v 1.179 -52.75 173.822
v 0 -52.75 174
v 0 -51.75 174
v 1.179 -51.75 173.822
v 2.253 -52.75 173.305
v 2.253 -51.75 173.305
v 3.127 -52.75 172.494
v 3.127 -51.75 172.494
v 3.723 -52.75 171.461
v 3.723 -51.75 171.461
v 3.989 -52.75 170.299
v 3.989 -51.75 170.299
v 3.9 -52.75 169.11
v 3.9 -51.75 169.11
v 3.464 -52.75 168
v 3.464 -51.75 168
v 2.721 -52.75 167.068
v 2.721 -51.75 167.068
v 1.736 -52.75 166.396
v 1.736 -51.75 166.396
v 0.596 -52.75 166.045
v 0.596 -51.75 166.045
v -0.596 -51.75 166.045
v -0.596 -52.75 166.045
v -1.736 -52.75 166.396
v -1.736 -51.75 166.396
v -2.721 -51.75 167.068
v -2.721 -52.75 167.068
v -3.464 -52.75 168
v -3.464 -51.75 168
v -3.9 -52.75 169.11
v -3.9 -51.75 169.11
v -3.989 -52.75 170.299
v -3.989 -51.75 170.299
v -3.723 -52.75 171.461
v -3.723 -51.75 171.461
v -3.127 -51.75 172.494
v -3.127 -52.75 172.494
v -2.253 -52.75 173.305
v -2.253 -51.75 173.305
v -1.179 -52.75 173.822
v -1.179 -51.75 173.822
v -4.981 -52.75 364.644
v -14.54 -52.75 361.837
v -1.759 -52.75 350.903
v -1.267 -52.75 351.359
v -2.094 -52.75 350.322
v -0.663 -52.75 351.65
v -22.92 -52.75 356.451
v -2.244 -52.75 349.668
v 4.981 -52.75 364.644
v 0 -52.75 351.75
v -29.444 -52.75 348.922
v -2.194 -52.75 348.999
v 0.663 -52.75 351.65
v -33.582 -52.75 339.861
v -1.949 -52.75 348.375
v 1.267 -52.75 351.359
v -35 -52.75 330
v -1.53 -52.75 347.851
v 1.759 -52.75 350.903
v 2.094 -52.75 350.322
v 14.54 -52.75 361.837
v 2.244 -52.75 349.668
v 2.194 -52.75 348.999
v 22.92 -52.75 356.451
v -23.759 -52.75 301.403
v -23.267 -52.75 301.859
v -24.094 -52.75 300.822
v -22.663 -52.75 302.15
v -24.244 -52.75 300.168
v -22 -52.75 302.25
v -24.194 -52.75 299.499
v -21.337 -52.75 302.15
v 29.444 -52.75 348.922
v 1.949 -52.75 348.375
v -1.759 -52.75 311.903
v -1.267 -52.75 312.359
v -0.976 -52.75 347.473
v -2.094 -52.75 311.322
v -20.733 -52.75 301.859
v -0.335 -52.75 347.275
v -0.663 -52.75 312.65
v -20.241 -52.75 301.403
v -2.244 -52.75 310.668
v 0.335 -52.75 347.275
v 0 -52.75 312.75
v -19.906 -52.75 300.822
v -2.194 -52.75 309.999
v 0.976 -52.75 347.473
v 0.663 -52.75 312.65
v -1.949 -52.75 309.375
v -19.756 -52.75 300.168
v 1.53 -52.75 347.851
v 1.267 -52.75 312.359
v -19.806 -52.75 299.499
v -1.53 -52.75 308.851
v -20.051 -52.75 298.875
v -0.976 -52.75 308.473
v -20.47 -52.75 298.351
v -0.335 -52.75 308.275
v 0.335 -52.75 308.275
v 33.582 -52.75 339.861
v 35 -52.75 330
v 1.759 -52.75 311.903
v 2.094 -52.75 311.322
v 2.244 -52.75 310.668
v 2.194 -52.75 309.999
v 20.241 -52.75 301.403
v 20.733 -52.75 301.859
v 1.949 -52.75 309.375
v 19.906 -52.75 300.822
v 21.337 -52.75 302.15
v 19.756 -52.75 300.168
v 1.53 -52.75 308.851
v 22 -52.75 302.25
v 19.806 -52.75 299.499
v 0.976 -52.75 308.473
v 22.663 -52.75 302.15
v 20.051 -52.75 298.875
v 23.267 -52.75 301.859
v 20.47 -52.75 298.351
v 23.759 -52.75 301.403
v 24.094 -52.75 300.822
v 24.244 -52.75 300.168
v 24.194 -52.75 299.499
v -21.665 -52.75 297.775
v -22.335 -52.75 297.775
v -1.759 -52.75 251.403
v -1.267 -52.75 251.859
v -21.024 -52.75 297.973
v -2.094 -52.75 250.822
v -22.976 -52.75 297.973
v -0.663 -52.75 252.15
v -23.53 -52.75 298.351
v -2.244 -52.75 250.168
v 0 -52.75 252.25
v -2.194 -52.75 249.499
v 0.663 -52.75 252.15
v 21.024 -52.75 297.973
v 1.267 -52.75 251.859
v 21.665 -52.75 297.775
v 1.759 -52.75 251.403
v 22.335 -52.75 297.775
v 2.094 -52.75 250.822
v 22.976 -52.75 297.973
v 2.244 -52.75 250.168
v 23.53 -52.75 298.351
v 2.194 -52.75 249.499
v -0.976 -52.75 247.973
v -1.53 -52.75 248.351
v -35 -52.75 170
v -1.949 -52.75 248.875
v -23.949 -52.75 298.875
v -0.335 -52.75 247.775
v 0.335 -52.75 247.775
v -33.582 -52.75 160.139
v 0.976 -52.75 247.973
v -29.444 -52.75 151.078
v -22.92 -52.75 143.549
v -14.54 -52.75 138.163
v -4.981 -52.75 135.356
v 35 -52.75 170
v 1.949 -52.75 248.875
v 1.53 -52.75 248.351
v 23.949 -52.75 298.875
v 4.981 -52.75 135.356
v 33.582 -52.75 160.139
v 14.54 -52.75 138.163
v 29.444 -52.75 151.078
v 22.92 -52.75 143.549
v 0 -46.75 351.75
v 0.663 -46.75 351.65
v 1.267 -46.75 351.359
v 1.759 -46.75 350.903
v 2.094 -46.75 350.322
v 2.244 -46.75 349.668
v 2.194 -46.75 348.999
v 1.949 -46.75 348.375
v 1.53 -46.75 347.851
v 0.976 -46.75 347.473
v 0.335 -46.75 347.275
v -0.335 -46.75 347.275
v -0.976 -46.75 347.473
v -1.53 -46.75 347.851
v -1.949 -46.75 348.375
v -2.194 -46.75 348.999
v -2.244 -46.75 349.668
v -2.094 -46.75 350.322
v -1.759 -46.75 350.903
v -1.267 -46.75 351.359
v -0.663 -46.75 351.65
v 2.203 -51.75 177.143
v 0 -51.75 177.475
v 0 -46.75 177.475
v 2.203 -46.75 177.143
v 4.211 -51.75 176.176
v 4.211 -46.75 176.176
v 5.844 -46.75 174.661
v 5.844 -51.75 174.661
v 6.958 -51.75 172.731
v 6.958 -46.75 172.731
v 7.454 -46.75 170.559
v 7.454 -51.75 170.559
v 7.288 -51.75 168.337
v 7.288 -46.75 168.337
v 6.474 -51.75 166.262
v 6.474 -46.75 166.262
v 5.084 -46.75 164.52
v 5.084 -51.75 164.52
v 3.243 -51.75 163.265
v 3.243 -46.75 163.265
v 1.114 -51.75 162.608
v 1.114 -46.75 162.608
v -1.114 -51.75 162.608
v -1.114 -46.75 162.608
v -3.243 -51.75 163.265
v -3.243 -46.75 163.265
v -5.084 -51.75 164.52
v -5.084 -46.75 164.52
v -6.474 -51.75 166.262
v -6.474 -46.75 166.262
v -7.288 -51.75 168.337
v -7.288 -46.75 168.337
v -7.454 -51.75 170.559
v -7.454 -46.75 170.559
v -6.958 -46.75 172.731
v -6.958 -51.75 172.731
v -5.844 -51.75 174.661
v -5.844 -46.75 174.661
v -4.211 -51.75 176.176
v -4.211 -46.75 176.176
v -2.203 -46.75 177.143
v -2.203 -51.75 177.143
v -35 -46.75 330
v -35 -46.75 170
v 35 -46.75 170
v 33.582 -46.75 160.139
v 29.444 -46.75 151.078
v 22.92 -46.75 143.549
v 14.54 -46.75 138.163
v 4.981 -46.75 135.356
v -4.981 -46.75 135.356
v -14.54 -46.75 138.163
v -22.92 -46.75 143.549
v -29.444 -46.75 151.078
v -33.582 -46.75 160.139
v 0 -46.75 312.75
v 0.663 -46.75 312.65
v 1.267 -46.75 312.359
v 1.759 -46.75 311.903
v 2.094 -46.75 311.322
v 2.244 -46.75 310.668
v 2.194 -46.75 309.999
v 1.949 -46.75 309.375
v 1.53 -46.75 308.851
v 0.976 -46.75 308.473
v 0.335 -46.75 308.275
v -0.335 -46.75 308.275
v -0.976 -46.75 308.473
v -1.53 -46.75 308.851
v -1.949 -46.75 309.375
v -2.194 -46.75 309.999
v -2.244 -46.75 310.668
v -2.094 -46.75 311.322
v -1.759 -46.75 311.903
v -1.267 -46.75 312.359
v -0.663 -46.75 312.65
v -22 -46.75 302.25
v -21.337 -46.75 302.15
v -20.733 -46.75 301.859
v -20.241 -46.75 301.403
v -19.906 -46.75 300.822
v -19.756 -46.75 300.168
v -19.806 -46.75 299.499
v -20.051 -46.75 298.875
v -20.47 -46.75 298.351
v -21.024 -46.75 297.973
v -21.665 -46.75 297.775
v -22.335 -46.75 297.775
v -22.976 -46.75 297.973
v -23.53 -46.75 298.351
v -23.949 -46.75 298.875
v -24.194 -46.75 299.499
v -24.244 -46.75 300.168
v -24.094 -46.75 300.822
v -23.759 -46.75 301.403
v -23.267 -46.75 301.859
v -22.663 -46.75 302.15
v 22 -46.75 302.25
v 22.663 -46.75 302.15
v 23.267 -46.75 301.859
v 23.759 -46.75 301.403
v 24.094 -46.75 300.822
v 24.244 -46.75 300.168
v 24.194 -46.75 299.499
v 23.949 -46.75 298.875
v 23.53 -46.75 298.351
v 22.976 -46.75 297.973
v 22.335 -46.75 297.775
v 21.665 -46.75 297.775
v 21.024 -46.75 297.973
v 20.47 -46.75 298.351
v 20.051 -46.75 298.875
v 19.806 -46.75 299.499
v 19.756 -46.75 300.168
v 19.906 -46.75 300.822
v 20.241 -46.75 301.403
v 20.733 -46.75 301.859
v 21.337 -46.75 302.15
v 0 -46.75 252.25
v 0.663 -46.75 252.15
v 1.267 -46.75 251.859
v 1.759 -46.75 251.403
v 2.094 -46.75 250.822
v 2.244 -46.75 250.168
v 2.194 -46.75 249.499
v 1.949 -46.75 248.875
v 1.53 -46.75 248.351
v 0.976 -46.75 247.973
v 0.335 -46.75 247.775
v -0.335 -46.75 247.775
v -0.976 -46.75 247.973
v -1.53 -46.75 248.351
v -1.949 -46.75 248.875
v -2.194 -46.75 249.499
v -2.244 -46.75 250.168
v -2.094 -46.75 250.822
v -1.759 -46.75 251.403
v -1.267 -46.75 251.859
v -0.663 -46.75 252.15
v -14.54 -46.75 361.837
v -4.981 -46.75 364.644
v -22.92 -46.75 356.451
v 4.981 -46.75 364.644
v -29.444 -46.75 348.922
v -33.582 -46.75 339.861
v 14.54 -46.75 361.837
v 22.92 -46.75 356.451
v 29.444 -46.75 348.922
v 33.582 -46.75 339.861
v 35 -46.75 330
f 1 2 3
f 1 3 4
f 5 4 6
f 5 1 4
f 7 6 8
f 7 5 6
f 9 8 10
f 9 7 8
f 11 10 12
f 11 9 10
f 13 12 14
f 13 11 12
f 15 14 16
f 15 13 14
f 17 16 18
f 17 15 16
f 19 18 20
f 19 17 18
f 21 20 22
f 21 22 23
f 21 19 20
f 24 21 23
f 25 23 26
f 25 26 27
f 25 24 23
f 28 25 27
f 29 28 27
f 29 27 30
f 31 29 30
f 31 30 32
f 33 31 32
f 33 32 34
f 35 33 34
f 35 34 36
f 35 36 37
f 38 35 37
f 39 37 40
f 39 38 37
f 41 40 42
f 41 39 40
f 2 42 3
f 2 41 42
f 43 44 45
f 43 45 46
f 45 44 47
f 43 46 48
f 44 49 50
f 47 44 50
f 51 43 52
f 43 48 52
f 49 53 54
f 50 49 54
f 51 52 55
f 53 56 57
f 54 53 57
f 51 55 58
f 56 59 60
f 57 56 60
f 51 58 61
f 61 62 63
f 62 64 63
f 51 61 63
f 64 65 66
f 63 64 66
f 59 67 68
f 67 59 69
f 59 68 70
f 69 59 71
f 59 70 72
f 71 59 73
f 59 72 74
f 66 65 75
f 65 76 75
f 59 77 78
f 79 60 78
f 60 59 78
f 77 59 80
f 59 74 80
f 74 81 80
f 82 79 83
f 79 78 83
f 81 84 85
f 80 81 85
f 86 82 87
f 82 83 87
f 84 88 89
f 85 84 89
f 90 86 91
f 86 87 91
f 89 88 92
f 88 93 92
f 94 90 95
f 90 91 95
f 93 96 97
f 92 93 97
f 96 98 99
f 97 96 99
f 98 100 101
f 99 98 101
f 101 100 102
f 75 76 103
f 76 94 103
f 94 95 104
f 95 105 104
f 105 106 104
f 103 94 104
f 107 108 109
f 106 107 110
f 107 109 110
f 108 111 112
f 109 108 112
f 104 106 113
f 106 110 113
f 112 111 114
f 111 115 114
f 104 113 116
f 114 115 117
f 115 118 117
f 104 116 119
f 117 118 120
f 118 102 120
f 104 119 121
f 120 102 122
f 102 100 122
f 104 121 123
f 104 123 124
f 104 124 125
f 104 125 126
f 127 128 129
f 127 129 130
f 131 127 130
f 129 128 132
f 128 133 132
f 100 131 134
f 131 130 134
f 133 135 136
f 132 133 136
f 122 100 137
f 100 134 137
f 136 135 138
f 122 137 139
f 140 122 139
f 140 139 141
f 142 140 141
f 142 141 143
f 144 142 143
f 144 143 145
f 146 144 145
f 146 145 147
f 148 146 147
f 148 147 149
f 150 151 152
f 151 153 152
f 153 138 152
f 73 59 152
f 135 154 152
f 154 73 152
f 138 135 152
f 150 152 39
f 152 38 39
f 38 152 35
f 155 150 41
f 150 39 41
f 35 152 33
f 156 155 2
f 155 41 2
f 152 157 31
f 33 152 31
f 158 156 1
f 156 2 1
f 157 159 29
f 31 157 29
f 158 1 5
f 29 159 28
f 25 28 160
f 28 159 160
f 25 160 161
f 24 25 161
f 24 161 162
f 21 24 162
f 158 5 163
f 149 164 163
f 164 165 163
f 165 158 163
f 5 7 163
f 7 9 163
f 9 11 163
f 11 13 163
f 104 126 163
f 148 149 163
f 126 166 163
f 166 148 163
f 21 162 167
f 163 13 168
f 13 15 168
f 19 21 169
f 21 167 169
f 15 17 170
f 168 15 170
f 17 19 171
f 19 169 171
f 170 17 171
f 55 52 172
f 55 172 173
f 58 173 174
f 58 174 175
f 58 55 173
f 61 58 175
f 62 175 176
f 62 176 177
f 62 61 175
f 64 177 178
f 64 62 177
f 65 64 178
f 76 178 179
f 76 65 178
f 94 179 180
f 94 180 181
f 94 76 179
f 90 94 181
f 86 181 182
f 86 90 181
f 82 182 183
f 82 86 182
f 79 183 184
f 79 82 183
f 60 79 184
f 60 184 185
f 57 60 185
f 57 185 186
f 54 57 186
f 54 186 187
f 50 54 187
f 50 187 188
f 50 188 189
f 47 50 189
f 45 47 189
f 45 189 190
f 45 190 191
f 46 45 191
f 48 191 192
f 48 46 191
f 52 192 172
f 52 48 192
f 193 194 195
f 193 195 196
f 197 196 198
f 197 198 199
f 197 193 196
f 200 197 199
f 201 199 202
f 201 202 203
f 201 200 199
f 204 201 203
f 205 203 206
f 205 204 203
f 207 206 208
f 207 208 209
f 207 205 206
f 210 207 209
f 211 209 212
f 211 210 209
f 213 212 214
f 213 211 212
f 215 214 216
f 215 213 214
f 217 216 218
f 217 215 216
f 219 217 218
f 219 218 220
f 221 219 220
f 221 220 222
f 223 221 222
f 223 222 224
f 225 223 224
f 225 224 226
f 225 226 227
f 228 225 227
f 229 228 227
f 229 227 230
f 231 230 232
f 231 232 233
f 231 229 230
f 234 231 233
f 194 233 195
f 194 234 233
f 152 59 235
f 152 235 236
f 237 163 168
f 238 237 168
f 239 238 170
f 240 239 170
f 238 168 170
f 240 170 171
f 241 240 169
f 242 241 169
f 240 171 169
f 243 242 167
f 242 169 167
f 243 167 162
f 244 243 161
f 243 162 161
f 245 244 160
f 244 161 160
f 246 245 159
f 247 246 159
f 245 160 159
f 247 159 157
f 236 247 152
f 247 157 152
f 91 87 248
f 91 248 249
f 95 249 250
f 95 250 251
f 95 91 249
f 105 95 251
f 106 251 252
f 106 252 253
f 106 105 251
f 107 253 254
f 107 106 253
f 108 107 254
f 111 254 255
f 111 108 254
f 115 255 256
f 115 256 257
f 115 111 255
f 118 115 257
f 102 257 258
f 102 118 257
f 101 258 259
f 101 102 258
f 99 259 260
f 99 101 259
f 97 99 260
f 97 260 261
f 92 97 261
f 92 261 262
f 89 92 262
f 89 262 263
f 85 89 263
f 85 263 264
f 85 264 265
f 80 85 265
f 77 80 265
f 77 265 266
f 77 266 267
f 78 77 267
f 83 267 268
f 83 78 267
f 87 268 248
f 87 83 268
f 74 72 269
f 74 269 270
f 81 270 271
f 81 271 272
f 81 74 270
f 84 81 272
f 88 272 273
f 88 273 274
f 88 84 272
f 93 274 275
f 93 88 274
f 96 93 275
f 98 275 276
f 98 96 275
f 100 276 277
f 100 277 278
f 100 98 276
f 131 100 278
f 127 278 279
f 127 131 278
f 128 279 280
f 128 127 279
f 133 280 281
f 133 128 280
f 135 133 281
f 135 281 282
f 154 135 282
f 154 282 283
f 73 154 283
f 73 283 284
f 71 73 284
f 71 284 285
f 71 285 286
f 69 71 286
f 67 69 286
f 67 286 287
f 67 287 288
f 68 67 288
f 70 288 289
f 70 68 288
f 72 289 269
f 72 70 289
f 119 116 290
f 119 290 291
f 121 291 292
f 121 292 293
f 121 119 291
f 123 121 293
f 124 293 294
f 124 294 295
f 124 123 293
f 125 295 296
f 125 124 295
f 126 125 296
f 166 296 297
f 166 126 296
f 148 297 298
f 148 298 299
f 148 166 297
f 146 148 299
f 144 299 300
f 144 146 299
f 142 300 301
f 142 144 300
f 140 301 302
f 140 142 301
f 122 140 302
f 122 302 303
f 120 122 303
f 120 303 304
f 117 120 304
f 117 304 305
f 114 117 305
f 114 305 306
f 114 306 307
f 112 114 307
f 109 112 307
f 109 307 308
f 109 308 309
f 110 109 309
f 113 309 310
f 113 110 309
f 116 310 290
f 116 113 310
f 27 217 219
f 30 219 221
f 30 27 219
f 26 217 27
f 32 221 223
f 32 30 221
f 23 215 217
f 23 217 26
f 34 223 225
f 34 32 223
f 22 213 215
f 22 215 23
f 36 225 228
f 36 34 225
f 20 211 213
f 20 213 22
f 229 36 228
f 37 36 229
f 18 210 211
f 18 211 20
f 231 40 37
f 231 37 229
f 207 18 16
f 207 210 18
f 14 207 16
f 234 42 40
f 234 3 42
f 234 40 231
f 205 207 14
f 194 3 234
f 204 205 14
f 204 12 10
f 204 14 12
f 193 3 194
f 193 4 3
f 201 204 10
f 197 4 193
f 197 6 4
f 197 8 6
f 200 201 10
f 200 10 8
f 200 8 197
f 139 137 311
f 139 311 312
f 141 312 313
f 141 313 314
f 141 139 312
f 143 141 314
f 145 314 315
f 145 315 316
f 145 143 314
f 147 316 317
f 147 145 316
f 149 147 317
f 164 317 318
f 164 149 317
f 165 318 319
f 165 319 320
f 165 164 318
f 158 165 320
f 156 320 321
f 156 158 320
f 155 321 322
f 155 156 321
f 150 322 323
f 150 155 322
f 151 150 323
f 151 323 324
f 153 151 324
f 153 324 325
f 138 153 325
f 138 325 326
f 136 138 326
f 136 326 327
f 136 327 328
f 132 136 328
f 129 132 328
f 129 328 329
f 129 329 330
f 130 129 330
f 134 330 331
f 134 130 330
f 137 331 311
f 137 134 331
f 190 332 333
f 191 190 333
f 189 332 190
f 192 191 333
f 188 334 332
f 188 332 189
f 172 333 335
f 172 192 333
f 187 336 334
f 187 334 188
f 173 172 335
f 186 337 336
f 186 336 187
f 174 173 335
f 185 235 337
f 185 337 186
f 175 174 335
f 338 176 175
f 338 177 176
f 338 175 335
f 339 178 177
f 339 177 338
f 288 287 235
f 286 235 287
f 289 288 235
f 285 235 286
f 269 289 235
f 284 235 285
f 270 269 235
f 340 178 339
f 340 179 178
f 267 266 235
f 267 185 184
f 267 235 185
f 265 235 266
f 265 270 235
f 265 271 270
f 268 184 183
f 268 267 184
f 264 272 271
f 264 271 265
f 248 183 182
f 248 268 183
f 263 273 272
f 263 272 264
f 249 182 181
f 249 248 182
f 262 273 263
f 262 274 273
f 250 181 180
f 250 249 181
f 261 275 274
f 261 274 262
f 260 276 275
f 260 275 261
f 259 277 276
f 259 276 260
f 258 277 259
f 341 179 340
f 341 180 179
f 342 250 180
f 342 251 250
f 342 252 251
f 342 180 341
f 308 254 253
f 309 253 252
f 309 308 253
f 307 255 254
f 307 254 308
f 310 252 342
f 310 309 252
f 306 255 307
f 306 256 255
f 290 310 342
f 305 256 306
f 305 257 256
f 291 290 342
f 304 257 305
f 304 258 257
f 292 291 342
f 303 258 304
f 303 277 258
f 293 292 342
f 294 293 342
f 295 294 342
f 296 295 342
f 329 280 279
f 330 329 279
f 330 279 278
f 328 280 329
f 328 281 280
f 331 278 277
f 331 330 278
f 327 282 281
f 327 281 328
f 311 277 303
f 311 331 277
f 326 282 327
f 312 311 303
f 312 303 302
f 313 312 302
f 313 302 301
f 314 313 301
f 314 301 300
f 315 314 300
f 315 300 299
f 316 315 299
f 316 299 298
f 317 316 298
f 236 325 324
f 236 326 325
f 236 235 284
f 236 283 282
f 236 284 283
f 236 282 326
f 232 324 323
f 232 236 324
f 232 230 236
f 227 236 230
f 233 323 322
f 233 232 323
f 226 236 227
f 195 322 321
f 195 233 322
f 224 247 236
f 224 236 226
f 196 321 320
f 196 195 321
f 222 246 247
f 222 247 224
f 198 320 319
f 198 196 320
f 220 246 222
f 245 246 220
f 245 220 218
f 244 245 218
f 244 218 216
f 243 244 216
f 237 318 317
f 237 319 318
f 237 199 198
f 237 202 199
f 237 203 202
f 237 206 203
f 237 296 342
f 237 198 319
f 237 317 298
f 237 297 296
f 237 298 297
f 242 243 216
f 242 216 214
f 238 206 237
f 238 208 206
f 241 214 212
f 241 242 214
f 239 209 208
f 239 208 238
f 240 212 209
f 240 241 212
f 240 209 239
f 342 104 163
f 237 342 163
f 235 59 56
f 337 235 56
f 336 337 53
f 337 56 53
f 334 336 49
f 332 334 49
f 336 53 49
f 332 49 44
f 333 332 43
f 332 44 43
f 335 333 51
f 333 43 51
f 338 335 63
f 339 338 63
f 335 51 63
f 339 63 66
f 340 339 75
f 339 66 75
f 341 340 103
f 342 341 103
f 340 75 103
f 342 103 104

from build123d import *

# Parameters (mm, degrees)
PLACA_START                   = -52.75
SK_PLACA_W                    = 70
SK_PLACA_H                    = 160
PLACA_DEPTH                   = 6
EXTREMOS_START                = -52.75
SK_EXTREMOS_R                 = 35
EXTREMOS_DEPTH                = 6
PASANTES_M4_SEPARADORES_START = -52.75
SK_PASANTES_M4_SEPARADORES_R  = 2.25
PASANTES_M4_SEPARADORES_DEPTH = 6
ALOJAMIENTO_696ZZ_START       = -51.75
SK_ALOJAMIENTO_696ZZ_R        = 7.475
ALOJAMIENTO_696ZZ_DEPTH       = 5
PASO_EXTRACTOR_START          = -52.75
SK_PASO_EXTRACTOR_R           = 4
PASO_EXTRACTOR_DEPTH          = 1
PASANTES_M4_EJEFALSO_J3_START = -52.75
SK_PASANTES_M4_EJEFALSO_J3_R  = 2.25
PASANTES_M4_EJEFALSO_J3_DEPTH = 6


with BuildPart() as part:
    # Sk_Placa → Placa (new body)
    with BuildSketch(Plane(origin=(0, 0, 0), x_dir=(1, 0, 0), z_dir=(0, 1, 0)).offset(PLACA_START)):
        with Locations((0, -250)):
            Rectangle(SK_PLACA_W, SK_PLACA_H)
    extrude(amount=PLACA_DEPTH)

    # Sk_Extremos → Extremos (add)
    with BuildSketch(Plane(origin=(0, 0, 0), x_dir=(1, 0, 0), z_dir=(0, 1, 0)).offset(EXTREMOS_START)):
        with Locations((0, -170)):
            Circle(SK_EXTREMOS_R)
        with Locations((0, -330)):
            Circle(SK_EXTREMOS_R)
    extrude(amount=EXTREMOS_DEPTH)

    # Sk_Pasantes_M4_separadores → Pasantes_M4_separadores (cut)
    with BuildSketch(Plane(origin=(0, 0, 0), x_dir=(1, 0, 0), z_dir=(0, 1, 0)).offset(PASANTES_M4_SEPARADORES_START)):
        with Locations(Location((0, -250, 0), (0, 0, 270))):
            Circle(SK_PASANTES_M4_SEPARADORES_R)
        with Locations(Location((-22, -300, 0), (0, 0, 270))):
            Circle(SK_PASANTES_M4_SEPARADORES_R)
        with Locations(Location((22, -300, 0), (0, 0, 270))):
            Circle(SK_PASANTES_M4_SEPARADORES_R)
    extrude(amount=PASANTES_M4_SEPARADORES_DEPTH, mode=Mode.SUBTRACT)

    # Sk_Alojamiento_696ZZ → Alojamiento_696ZZ (cut)
    with BuildSketch(Plane(origin=(0, 0, 0), x_dir=(1, 0, 0), z_dir=(0, 1, 0)).offset(ALOJAMIENTO_696ZZ_START)):
        with Locations(Location((0, -170, 0), (0, 0, 270))):
            Circle(SK_ALOJAMIENTO_696ZZ_R)
    extrude(amount=ALOJAMIENTO_696ZZ_DEPTH, mode=Mode.SUBTRACT)

    # Sk_Paso_extractor → Paso_extractor (cut)
    with BuildSketch(Plane(origin=(0, 0, 0), x_dir=(1, 0, 0), z_dir=(0, 1, 0)).offset(PASO_EXTRACTOR_START)):
        with Locations(Location((0, -170, 0), (0, 0, 270))):
            Circle(SK_PASO_EXTRACTOR_R)
    extrude(amount=PASO_EXTRACTOR_DEPTH, mode=Mode.SUBTRACT)

    # Sk_Pasantes_M4_ejefalso_J3 → Pasantes_M4_ejefalso_J3 (cut)
    with BuildSketch(Plane(origin=(0, 0, 0), x_dir=(1, 0, 0), z_dir=(0, 1, 0)).offset(PASANTES_M4_EJEFALSO_J3_START)):
        with Locations(Location((0, -310.5, 0), (0, 0, 270))):
            Circle(SK_PASANTES_M4_EJEFALSO_J3_R)
        with Locations(Location((0, -349.5, 0), (0, 0, 270))):
            Circle(SK_PASANTES_M4_EJEFALSO_J3_R)
    extrude(amount=PASANTES_M4_EJEFALSO_J3_DEPTH, mode=Mode.SUBTRACT)


solid = part.part
